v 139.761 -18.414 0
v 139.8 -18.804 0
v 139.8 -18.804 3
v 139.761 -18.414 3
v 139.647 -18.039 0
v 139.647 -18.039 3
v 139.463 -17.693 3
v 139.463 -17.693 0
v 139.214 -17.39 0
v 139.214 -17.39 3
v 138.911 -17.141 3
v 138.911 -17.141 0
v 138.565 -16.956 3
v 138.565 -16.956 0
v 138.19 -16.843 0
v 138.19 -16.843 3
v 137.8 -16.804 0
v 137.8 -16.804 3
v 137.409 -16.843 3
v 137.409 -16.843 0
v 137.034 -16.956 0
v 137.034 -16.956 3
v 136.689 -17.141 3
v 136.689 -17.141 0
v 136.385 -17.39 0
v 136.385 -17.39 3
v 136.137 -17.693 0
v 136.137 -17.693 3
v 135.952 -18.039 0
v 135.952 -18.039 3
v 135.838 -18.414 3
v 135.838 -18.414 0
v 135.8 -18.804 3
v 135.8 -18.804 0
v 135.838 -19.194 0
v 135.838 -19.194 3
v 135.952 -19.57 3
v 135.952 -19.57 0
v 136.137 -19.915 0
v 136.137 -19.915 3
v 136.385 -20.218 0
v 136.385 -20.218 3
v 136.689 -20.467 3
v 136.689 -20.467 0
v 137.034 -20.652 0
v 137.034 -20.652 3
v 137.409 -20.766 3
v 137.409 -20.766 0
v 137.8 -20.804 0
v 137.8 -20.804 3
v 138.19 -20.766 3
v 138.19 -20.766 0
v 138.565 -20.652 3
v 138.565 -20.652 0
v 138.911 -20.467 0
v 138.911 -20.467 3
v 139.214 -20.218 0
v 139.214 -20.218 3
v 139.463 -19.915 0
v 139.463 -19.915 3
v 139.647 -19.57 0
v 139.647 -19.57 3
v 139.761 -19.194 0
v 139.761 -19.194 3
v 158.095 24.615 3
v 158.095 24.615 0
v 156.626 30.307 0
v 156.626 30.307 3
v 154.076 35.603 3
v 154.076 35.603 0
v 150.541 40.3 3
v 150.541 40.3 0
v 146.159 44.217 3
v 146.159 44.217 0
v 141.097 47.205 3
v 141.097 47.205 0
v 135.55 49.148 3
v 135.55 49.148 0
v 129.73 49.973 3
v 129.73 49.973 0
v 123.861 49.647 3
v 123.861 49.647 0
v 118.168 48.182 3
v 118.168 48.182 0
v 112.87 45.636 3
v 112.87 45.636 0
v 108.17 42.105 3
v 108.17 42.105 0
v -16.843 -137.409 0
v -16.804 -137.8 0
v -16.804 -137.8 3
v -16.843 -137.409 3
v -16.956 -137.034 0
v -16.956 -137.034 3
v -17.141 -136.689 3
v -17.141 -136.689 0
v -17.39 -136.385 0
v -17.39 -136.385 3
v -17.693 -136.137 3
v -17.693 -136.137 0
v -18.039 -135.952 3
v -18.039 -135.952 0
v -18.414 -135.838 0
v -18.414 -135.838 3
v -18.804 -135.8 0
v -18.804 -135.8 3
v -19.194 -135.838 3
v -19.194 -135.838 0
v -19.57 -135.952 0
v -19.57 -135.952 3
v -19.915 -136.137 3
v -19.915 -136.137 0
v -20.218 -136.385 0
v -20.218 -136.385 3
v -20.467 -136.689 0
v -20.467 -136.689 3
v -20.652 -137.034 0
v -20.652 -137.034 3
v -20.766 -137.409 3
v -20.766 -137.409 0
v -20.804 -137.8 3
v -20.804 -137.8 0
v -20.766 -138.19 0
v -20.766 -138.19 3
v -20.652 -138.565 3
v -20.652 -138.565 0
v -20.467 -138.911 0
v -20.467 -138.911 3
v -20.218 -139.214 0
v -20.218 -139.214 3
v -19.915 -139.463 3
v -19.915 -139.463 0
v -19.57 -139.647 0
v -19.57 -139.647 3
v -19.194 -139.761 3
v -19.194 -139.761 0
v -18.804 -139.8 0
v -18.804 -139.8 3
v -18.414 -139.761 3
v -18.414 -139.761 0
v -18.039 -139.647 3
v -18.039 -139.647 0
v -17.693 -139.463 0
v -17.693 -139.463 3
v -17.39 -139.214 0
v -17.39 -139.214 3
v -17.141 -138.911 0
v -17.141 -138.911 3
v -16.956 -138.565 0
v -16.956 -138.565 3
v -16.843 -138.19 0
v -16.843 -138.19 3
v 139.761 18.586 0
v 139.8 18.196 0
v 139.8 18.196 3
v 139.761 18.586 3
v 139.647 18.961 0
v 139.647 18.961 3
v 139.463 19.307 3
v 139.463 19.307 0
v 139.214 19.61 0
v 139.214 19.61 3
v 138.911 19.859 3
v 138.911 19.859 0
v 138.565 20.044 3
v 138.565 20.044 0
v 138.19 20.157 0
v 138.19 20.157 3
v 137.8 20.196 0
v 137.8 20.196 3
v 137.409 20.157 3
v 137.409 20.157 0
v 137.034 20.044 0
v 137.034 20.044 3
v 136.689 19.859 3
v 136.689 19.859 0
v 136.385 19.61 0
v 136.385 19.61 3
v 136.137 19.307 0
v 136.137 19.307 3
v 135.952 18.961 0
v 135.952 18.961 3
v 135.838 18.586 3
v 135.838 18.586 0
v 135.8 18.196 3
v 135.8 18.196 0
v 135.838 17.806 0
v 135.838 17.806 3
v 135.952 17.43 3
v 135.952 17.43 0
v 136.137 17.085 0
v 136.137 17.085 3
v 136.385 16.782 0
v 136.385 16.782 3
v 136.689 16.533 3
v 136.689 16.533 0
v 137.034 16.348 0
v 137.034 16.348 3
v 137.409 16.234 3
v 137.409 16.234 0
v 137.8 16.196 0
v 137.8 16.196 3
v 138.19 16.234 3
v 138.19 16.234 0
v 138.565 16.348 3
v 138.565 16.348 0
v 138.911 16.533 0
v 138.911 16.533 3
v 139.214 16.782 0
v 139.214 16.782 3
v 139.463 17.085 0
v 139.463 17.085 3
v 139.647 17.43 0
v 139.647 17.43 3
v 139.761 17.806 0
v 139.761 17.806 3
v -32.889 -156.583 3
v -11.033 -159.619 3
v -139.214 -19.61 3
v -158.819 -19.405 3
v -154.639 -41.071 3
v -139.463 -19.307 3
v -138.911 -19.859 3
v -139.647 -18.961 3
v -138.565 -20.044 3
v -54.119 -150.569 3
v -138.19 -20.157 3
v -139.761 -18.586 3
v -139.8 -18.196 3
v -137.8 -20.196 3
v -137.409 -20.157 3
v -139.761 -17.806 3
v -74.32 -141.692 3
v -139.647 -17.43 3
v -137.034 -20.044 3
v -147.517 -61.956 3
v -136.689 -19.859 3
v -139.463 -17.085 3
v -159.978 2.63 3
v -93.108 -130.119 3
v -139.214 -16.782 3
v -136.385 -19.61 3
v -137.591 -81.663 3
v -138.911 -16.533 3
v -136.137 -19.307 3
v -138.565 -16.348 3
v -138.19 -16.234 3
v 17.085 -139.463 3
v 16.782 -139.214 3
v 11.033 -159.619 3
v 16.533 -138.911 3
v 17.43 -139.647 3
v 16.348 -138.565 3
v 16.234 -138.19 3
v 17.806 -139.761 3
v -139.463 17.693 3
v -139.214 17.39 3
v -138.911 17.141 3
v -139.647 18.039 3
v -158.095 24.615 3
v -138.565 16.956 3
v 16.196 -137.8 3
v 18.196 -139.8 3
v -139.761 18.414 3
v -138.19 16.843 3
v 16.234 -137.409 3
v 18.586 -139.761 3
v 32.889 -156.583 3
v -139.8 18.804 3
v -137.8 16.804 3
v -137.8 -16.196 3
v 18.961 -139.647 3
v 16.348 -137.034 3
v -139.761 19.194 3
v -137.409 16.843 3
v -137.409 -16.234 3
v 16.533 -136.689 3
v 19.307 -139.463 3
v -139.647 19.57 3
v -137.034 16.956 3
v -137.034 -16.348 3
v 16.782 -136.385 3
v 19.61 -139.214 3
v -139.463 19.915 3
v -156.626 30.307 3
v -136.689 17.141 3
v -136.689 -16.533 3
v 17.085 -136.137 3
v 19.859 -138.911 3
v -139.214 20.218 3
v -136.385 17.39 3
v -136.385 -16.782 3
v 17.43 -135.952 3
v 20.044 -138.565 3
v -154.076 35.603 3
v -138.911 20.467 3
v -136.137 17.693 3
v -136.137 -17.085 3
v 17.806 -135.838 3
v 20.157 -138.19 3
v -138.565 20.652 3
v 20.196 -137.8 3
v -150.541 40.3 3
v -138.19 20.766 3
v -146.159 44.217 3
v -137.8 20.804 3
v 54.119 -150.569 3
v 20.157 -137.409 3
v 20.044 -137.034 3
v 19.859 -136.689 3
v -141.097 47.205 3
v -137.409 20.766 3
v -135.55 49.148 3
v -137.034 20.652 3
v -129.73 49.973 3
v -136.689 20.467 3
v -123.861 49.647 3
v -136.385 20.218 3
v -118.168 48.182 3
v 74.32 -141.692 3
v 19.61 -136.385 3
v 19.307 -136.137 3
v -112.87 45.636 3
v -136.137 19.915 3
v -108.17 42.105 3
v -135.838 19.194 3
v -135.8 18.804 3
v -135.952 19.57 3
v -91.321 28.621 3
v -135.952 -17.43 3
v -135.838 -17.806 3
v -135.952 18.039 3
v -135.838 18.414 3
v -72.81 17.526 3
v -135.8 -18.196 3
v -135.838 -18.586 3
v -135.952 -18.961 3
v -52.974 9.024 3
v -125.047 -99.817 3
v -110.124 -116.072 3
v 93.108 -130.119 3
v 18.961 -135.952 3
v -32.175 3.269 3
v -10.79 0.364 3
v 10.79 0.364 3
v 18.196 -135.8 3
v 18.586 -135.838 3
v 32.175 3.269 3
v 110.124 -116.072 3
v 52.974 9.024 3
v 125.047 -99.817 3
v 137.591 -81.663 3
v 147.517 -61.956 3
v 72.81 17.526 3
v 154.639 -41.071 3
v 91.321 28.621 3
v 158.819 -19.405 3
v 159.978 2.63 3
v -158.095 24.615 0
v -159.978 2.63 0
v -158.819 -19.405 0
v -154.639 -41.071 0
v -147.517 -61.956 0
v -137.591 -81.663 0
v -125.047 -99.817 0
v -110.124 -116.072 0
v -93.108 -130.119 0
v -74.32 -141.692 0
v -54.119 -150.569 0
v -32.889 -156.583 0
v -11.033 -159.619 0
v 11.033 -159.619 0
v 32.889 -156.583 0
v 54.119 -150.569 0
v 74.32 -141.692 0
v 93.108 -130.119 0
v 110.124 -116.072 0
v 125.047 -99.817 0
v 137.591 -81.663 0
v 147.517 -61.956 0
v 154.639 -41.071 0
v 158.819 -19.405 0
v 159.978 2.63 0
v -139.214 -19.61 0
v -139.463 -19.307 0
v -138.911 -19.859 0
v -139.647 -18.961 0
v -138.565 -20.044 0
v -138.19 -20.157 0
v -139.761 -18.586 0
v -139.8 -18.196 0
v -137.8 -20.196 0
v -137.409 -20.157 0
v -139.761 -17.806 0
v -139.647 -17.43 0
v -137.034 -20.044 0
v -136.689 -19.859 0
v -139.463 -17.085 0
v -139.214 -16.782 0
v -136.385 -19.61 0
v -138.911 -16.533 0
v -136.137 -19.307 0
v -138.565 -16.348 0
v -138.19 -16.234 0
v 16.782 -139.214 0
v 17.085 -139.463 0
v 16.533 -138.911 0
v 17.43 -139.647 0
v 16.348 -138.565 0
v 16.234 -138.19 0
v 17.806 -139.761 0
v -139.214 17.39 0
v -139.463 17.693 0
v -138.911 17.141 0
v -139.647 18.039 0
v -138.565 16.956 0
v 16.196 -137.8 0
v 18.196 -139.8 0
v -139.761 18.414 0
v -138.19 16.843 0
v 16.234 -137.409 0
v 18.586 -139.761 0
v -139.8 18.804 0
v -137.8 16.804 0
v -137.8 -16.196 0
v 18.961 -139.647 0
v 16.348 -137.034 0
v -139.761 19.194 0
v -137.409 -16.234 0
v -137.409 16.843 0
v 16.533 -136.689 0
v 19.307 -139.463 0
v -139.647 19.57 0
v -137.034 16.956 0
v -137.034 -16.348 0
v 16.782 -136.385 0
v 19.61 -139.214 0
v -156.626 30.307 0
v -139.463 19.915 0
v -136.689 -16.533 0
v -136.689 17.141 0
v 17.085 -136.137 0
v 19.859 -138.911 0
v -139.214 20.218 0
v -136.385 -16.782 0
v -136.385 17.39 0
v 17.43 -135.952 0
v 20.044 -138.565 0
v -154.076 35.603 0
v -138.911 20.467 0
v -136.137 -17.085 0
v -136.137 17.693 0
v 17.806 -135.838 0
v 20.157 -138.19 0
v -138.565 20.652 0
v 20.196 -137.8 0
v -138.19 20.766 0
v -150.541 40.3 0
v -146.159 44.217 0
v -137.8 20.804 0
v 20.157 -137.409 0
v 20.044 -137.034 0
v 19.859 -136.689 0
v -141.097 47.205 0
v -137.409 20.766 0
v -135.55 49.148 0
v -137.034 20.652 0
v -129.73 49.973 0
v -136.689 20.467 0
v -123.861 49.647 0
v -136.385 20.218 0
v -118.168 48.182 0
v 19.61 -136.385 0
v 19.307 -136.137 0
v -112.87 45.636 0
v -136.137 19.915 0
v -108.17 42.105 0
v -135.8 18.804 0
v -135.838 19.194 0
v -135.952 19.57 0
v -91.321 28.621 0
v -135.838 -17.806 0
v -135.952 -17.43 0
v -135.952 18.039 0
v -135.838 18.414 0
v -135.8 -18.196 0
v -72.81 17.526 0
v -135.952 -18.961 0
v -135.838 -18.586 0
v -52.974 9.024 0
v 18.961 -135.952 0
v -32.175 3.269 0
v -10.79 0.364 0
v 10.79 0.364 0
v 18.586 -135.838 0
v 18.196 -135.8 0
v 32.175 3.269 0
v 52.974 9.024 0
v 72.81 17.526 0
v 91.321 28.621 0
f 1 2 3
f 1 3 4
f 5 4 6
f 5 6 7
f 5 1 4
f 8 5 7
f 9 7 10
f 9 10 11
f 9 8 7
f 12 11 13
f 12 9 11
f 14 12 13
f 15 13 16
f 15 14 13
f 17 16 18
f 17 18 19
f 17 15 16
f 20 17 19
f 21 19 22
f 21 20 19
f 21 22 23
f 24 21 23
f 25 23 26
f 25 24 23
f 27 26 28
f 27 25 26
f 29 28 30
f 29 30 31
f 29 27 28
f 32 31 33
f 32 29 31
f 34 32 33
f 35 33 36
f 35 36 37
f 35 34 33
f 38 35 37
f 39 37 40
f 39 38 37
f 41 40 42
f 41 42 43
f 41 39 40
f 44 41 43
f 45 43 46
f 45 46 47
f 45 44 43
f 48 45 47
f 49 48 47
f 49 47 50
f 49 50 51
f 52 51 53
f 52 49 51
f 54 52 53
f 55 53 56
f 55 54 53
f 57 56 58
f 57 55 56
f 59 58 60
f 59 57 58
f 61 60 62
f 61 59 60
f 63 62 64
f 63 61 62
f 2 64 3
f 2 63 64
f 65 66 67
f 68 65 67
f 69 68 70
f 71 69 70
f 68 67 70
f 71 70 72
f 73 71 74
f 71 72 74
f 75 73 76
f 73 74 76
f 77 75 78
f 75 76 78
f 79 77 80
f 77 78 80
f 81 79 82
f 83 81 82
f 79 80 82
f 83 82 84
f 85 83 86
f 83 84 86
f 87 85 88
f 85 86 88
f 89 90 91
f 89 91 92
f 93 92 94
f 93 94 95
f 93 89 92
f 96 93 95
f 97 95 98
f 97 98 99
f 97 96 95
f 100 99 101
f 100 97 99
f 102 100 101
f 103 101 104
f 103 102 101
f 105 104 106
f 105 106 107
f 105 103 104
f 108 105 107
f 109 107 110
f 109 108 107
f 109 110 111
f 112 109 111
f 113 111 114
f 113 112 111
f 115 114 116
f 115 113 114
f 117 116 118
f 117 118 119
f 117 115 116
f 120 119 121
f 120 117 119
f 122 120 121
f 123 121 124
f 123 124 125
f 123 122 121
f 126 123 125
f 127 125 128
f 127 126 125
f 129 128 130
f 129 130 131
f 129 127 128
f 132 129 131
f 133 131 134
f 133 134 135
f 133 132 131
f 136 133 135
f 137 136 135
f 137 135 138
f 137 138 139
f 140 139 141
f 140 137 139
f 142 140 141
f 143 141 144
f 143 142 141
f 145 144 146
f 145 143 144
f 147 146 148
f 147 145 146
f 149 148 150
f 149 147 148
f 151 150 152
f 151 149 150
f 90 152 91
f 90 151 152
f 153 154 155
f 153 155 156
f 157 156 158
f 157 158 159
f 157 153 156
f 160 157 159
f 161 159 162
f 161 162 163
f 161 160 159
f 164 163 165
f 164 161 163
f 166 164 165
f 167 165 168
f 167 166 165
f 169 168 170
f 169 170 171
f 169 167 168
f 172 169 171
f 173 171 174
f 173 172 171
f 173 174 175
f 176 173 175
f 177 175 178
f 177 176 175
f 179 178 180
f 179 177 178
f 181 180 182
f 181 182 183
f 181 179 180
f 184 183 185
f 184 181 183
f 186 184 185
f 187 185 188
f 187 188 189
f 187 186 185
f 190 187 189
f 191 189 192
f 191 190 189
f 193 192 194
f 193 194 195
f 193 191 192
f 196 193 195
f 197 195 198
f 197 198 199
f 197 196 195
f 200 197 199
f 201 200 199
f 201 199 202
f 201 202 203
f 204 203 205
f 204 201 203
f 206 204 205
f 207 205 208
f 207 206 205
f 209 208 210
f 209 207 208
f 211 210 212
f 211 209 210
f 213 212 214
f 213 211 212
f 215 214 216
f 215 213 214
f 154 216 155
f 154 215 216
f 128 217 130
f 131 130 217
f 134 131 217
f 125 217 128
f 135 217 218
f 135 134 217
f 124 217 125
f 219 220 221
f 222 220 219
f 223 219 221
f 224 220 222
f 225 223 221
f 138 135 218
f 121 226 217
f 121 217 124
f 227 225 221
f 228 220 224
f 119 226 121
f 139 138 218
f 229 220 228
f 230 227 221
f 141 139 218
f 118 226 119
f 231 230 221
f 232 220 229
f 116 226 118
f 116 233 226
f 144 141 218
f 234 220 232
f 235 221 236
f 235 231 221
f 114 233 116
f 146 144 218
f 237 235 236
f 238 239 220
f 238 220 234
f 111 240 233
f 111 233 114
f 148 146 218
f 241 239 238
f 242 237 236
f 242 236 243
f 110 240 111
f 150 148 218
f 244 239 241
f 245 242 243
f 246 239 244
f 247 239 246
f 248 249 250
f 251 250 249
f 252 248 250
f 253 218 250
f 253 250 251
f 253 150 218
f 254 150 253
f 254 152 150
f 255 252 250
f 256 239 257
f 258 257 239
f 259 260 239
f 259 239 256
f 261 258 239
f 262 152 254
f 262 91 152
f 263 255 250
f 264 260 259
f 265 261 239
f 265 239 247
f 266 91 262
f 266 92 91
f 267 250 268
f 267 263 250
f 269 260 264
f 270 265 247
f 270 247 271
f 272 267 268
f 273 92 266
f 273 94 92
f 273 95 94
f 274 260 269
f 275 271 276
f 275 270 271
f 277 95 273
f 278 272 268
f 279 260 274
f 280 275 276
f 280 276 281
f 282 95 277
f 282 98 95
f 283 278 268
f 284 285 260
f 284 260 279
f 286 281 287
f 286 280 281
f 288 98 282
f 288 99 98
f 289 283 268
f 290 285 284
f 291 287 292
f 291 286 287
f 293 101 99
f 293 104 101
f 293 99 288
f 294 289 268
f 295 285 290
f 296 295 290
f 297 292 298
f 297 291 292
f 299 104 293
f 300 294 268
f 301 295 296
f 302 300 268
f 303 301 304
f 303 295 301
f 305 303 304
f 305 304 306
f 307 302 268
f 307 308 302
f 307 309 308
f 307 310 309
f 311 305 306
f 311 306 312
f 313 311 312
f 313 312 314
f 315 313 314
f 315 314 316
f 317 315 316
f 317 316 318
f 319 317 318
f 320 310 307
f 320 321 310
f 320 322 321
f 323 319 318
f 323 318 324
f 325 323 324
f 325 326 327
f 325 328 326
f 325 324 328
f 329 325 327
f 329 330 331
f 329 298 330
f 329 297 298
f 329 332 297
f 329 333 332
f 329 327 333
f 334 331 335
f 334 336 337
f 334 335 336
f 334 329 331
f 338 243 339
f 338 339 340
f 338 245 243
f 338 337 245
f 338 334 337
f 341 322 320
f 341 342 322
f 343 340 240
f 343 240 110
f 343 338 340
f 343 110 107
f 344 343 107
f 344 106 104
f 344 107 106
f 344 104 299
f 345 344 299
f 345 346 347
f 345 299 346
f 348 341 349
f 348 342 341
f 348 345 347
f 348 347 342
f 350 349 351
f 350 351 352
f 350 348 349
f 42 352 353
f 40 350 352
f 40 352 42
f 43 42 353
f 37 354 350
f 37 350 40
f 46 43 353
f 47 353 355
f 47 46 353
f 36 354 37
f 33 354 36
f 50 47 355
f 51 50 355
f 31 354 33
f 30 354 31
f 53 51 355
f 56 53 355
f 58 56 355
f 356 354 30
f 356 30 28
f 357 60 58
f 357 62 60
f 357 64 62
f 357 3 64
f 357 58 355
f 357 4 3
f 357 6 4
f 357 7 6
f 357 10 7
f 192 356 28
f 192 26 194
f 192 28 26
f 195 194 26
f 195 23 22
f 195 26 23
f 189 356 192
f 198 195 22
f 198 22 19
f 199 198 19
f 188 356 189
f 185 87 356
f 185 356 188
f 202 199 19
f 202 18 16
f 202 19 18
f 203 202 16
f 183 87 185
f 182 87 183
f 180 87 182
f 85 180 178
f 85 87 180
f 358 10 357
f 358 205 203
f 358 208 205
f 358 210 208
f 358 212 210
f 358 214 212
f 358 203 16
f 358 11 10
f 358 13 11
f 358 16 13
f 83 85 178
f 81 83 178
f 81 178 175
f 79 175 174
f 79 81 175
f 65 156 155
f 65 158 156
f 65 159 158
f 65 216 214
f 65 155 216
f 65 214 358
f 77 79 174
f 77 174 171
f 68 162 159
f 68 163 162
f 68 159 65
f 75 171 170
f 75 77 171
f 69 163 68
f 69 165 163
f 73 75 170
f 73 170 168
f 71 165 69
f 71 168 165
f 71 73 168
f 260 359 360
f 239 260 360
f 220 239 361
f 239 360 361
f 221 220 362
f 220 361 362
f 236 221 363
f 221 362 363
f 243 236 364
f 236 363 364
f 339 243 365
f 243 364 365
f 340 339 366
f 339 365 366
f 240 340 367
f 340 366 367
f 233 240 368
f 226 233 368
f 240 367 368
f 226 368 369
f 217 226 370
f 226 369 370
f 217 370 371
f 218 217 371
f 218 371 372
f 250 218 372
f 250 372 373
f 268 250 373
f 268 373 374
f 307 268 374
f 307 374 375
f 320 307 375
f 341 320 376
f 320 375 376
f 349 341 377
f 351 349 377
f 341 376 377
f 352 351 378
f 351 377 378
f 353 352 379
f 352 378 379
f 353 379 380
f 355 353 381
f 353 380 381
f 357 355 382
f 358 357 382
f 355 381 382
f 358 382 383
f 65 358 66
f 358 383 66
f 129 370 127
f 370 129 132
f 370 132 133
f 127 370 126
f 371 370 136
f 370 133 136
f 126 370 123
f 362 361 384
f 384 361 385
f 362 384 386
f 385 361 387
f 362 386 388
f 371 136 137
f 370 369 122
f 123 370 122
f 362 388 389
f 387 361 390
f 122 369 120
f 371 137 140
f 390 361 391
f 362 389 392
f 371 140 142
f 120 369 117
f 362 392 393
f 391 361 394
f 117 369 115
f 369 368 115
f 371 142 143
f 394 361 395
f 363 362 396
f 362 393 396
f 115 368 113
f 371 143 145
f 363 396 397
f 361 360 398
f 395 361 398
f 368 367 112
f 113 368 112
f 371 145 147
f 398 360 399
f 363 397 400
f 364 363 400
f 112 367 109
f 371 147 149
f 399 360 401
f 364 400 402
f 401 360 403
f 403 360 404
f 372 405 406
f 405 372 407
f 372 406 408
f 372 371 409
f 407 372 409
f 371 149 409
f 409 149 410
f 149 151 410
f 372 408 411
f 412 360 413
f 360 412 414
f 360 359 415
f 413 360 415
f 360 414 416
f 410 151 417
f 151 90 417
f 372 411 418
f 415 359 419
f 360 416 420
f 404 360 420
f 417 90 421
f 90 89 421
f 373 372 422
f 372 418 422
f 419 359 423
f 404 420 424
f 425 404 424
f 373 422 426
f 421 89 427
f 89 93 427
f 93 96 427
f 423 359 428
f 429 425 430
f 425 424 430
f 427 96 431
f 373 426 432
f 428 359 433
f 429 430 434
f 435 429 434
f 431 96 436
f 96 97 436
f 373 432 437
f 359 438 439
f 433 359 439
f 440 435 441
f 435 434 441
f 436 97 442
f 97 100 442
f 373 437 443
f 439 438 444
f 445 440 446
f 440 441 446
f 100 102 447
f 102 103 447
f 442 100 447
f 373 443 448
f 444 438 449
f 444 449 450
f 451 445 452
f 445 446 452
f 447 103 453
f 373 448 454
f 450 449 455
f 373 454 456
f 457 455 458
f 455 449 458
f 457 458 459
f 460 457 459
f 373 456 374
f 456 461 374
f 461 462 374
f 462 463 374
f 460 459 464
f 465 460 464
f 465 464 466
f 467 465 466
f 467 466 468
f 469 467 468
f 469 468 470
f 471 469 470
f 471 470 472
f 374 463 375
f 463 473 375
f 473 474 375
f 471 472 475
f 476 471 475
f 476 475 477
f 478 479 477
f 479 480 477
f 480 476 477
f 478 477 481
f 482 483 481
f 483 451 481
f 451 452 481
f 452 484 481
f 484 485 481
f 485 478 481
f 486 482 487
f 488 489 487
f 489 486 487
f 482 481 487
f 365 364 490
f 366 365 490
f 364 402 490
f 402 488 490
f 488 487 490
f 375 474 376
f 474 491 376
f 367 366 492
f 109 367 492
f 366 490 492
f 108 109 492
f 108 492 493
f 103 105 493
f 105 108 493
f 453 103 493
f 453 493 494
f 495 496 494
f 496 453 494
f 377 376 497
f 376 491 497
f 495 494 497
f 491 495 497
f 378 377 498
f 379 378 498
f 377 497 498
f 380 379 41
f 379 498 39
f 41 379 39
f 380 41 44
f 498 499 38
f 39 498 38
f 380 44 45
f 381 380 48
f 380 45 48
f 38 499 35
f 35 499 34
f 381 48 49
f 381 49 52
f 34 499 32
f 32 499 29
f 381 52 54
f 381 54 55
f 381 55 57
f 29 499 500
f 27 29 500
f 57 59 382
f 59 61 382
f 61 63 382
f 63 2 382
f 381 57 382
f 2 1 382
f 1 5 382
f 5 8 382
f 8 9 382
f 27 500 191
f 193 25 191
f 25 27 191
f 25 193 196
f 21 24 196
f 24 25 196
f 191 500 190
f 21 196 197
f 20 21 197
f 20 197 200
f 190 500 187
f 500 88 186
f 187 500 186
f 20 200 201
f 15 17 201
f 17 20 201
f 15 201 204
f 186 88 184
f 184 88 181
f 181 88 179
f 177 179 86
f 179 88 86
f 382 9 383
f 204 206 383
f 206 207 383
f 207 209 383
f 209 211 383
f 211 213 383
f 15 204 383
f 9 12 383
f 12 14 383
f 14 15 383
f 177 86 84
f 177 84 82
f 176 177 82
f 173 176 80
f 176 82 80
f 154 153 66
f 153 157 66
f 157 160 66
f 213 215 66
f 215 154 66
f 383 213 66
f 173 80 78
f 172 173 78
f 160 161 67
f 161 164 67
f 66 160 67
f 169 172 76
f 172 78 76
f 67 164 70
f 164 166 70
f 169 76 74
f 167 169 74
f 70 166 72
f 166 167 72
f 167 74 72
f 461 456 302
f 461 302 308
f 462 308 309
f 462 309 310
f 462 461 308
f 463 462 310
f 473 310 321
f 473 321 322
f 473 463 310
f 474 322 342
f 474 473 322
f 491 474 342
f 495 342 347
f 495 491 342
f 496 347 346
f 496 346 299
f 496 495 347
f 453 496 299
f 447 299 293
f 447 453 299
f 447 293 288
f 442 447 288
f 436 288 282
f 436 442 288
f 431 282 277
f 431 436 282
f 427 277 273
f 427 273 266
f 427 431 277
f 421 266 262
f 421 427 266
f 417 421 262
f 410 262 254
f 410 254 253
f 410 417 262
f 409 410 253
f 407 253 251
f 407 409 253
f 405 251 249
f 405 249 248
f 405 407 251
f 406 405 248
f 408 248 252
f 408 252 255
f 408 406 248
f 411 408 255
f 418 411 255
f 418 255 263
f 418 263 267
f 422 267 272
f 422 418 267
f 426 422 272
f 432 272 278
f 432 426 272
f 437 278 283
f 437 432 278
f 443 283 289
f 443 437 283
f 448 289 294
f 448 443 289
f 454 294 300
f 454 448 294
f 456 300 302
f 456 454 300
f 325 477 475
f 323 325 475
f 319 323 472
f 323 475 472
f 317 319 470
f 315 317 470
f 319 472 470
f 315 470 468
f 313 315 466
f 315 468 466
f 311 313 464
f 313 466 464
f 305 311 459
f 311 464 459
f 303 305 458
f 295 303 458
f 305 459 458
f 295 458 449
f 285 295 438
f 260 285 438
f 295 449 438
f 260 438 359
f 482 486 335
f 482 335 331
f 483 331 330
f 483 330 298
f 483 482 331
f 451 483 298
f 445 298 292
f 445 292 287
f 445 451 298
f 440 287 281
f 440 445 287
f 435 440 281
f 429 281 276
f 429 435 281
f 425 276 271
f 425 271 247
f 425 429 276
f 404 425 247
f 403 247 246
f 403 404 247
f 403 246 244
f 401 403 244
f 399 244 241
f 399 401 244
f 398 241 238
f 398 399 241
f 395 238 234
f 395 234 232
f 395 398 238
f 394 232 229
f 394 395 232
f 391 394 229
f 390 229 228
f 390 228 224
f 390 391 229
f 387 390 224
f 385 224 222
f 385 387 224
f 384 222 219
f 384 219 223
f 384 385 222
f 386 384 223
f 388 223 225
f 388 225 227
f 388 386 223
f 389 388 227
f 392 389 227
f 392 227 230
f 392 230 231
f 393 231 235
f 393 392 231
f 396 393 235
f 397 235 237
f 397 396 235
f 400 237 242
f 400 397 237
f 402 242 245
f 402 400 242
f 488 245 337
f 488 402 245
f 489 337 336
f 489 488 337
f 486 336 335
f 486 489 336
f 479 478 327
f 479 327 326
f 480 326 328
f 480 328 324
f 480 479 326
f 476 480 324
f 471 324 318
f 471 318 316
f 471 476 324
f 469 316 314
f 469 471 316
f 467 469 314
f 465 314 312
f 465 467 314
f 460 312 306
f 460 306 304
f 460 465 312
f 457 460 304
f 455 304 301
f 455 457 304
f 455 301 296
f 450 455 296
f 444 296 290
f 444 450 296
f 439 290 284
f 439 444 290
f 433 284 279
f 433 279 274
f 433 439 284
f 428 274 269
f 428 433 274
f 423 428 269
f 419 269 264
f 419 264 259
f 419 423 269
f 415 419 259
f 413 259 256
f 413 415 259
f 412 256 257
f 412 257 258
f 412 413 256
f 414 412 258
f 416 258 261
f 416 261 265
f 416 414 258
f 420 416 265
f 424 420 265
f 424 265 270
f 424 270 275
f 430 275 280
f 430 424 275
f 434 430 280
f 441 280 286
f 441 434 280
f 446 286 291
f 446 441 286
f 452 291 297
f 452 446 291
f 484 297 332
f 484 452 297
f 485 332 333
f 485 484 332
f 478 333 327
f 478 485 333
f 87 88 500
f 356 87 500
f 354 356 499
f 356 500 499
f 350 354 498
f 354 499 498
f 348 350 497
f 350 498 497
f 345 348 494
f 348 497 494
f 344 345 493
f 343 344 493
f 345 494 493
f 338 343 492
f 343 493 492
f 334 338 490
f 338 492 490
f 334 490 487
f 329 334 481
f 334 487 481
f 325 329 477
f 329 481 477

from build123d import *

# Parameters (mm, degrees)
SKETCH_1_R      = 2
EXTRUDE_1_DEPTH = 3


with BuildPart() as part:
    # 草图1 → 凸台-拉伸1 (new body)
    with BuildSketch(Plane.XY):
        with BuildLine():
            ThreePointArc((-158.095170199, 24.615384615), (0, -160), (158.095170199, 24.615384615))
            ThreePointArc((158.095170199, 24.615384615), (138.371023625, 48.312884579), (108.17037961, 42.105263158))
            ThreePointArc((108.17037961, 42.105263158), (0, 0), (-108.17037961, 42.105263158))
            ThreePointArc((-108.17037961, 42.105263158), (-138.371023625, 48.312884579), (-158.095170199, 24.615384615))
        make_face()
        with Locations((137.799674336, 18.195823561)):
            Circle(SKETCH_1_R, mode=Mode.SUBTRACT)
        with Locations((137.799674336, -18.804176439)):
            Circle(SKETCH_1_R, mode=Mode.SUBTRACT)
        with Locations((18.195823561, -137.799674336)):
            Circle(SKETCH_1_R, mode=Mode.SUBTRACT)
        with Locations((-18.804176439, -137.799674336)):
            Circle(SKETCH_1_R, mode=Mode.SUBTRACT)
        with Locations((-137.799674336, -18.195823561)):
            Circle(SKETCH_1_R, mode=Mode.SUBTRACT)
        with Locations((-137.799674336, 18.804176439)):
            Circle(SKETCH_1_R, mode=Mode.SUBTRACT)
    extrude(amount=EXTRUDE_1_DEPTH)


solid = part.part
